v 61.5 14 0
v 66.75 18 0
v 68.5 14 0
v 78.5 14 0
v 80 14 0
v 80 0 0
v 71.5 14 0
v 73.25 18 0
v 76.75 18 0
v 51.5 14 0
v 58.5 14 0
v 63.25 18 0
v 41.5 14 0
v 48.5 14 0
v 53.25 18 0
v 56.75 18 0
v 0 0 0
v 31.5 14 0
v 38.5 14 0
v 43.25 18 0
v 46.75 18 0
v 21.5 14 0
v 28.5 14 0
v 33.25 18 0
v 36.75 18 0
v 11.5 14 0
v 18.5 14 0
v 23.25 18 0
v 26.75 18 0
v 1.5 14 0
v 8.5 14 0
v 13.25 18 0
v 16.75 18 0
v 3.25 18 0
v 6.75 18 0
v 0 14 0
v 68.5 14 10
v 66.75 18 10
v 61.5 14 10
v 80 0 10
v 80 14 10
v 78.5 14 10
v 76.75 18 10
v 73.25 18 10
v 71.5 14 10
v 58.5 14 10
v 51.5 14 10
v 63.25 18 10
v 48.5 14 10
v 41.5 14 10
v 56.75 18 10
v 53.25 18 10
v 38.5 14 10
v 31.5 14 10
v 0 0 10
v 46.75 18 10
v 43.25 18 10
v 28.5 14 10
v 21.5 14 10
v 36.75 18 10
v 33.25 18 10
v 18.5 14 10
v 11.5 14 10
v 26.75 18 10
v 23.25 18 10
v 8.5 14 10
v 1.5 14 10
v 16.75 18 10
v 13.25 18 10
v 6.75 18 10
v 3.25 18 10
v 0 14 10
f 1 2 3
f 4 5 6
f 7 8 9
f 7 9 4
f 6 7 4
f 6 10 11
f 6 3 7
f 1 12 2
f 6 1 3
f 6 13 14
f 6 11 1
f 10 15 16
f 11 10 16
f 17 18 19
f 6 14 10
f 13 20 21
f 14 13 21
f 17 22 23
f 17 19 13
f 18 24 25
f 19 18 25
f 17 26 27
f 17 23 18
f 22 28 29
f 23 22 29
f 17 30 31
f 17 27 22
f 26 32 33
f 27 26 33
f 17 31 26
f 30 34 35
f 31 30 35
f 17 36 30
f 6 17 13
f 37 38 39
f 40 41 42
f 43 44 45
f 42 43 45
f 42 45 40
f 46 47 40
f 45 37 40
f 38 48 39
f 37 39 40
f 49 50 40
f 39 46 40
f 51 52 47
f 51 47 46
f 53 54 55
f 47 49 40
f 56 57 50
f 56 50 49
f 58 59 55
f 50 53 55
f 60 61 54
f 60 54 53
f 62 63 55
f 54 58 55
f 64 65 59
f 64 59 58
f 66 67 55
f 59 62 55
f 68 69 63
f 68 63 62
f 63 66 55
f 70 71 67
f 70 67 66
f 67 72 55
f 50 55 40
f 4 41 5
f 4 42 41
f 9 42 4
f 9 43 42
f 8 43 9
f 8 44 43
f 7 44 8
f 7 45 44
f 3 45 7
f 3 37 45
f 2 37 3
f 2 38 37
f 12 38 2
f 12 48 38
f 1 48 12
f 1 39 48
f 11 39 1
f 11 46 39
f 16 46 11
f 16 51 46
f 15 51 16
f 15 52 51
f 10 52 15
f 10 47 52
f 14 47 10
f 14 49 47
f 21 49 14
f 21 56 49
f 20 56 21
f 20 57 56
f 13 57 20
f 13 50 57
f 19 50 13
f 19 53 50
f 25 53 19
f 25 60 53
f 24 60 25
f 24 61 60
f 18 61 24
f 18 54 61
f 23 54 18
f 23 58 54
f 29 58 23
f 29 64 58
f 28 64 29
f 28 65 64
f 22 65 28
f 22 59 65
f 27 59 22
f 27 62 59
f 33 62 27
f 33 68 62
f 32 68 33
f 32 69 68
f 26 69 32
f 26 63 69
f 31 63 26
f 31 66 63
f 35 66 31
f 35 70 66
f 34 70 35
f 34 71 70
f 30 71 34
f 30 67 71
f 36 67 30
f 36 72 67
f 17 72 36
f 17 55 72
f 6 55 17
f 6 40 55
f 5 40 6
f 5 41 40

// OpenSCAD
$fn = 32;

// ----------------------------------------------------------------------
// Gear rack: 8 teeth, pitch 10 mm
// ----------------------------------------------------------------------

// --- parameters (mm) ---
teeth = 8;                // number of teeth
pitch = 10;               // tooth pitch, X
root_w = 7;               // tooth width at the root
tip_w = 3.5;              // tooth width at the tip
base_h = 14;              // rack body height, Y
tooth_h = 4;              // tooth height above the body
plate_t = 10;             // rack width, Z (extrusion height)
fit_tol = 0.05;           // declared fit tolerance (prompt contract)
free_tol = 0.2;           // declared free tolerance (prompt contract)

rack_l = teeth * pitch;  // overall length
total_h = base_h + tooth_h;  // overall height

profile = [[0, 0], [80, 0], [80, 14], [78.5, 14], [76.75, 18], [73.25, 18], [71.5, 14], [68.5, 14], [66.75, 18], [63.25, 18], [61.5, 14], [58.5, 14], [56.75, 18], [53.25, 18], [51.5, 14], [48.5, 14], [46.75, 18], [43.25, 18], [41.5, 14], [38.5, 14], [36.75, 18], [33.25, 18], [31.5, 14], [28.5, 14], [26.75, 18], [23.25, 18], [21.5, 14], [18.5, 14], [16.75, 18], [13.25, 18], [11.5, 14], [8.5, 14], [6.75, 18], [3.25, 18], [1.5, 14], [0, 14]];  // primary outline, 36 points, counter clockwise

// --- the one profile operation ---
linear_extrude(height = plate_t) polygon(points = profile);
